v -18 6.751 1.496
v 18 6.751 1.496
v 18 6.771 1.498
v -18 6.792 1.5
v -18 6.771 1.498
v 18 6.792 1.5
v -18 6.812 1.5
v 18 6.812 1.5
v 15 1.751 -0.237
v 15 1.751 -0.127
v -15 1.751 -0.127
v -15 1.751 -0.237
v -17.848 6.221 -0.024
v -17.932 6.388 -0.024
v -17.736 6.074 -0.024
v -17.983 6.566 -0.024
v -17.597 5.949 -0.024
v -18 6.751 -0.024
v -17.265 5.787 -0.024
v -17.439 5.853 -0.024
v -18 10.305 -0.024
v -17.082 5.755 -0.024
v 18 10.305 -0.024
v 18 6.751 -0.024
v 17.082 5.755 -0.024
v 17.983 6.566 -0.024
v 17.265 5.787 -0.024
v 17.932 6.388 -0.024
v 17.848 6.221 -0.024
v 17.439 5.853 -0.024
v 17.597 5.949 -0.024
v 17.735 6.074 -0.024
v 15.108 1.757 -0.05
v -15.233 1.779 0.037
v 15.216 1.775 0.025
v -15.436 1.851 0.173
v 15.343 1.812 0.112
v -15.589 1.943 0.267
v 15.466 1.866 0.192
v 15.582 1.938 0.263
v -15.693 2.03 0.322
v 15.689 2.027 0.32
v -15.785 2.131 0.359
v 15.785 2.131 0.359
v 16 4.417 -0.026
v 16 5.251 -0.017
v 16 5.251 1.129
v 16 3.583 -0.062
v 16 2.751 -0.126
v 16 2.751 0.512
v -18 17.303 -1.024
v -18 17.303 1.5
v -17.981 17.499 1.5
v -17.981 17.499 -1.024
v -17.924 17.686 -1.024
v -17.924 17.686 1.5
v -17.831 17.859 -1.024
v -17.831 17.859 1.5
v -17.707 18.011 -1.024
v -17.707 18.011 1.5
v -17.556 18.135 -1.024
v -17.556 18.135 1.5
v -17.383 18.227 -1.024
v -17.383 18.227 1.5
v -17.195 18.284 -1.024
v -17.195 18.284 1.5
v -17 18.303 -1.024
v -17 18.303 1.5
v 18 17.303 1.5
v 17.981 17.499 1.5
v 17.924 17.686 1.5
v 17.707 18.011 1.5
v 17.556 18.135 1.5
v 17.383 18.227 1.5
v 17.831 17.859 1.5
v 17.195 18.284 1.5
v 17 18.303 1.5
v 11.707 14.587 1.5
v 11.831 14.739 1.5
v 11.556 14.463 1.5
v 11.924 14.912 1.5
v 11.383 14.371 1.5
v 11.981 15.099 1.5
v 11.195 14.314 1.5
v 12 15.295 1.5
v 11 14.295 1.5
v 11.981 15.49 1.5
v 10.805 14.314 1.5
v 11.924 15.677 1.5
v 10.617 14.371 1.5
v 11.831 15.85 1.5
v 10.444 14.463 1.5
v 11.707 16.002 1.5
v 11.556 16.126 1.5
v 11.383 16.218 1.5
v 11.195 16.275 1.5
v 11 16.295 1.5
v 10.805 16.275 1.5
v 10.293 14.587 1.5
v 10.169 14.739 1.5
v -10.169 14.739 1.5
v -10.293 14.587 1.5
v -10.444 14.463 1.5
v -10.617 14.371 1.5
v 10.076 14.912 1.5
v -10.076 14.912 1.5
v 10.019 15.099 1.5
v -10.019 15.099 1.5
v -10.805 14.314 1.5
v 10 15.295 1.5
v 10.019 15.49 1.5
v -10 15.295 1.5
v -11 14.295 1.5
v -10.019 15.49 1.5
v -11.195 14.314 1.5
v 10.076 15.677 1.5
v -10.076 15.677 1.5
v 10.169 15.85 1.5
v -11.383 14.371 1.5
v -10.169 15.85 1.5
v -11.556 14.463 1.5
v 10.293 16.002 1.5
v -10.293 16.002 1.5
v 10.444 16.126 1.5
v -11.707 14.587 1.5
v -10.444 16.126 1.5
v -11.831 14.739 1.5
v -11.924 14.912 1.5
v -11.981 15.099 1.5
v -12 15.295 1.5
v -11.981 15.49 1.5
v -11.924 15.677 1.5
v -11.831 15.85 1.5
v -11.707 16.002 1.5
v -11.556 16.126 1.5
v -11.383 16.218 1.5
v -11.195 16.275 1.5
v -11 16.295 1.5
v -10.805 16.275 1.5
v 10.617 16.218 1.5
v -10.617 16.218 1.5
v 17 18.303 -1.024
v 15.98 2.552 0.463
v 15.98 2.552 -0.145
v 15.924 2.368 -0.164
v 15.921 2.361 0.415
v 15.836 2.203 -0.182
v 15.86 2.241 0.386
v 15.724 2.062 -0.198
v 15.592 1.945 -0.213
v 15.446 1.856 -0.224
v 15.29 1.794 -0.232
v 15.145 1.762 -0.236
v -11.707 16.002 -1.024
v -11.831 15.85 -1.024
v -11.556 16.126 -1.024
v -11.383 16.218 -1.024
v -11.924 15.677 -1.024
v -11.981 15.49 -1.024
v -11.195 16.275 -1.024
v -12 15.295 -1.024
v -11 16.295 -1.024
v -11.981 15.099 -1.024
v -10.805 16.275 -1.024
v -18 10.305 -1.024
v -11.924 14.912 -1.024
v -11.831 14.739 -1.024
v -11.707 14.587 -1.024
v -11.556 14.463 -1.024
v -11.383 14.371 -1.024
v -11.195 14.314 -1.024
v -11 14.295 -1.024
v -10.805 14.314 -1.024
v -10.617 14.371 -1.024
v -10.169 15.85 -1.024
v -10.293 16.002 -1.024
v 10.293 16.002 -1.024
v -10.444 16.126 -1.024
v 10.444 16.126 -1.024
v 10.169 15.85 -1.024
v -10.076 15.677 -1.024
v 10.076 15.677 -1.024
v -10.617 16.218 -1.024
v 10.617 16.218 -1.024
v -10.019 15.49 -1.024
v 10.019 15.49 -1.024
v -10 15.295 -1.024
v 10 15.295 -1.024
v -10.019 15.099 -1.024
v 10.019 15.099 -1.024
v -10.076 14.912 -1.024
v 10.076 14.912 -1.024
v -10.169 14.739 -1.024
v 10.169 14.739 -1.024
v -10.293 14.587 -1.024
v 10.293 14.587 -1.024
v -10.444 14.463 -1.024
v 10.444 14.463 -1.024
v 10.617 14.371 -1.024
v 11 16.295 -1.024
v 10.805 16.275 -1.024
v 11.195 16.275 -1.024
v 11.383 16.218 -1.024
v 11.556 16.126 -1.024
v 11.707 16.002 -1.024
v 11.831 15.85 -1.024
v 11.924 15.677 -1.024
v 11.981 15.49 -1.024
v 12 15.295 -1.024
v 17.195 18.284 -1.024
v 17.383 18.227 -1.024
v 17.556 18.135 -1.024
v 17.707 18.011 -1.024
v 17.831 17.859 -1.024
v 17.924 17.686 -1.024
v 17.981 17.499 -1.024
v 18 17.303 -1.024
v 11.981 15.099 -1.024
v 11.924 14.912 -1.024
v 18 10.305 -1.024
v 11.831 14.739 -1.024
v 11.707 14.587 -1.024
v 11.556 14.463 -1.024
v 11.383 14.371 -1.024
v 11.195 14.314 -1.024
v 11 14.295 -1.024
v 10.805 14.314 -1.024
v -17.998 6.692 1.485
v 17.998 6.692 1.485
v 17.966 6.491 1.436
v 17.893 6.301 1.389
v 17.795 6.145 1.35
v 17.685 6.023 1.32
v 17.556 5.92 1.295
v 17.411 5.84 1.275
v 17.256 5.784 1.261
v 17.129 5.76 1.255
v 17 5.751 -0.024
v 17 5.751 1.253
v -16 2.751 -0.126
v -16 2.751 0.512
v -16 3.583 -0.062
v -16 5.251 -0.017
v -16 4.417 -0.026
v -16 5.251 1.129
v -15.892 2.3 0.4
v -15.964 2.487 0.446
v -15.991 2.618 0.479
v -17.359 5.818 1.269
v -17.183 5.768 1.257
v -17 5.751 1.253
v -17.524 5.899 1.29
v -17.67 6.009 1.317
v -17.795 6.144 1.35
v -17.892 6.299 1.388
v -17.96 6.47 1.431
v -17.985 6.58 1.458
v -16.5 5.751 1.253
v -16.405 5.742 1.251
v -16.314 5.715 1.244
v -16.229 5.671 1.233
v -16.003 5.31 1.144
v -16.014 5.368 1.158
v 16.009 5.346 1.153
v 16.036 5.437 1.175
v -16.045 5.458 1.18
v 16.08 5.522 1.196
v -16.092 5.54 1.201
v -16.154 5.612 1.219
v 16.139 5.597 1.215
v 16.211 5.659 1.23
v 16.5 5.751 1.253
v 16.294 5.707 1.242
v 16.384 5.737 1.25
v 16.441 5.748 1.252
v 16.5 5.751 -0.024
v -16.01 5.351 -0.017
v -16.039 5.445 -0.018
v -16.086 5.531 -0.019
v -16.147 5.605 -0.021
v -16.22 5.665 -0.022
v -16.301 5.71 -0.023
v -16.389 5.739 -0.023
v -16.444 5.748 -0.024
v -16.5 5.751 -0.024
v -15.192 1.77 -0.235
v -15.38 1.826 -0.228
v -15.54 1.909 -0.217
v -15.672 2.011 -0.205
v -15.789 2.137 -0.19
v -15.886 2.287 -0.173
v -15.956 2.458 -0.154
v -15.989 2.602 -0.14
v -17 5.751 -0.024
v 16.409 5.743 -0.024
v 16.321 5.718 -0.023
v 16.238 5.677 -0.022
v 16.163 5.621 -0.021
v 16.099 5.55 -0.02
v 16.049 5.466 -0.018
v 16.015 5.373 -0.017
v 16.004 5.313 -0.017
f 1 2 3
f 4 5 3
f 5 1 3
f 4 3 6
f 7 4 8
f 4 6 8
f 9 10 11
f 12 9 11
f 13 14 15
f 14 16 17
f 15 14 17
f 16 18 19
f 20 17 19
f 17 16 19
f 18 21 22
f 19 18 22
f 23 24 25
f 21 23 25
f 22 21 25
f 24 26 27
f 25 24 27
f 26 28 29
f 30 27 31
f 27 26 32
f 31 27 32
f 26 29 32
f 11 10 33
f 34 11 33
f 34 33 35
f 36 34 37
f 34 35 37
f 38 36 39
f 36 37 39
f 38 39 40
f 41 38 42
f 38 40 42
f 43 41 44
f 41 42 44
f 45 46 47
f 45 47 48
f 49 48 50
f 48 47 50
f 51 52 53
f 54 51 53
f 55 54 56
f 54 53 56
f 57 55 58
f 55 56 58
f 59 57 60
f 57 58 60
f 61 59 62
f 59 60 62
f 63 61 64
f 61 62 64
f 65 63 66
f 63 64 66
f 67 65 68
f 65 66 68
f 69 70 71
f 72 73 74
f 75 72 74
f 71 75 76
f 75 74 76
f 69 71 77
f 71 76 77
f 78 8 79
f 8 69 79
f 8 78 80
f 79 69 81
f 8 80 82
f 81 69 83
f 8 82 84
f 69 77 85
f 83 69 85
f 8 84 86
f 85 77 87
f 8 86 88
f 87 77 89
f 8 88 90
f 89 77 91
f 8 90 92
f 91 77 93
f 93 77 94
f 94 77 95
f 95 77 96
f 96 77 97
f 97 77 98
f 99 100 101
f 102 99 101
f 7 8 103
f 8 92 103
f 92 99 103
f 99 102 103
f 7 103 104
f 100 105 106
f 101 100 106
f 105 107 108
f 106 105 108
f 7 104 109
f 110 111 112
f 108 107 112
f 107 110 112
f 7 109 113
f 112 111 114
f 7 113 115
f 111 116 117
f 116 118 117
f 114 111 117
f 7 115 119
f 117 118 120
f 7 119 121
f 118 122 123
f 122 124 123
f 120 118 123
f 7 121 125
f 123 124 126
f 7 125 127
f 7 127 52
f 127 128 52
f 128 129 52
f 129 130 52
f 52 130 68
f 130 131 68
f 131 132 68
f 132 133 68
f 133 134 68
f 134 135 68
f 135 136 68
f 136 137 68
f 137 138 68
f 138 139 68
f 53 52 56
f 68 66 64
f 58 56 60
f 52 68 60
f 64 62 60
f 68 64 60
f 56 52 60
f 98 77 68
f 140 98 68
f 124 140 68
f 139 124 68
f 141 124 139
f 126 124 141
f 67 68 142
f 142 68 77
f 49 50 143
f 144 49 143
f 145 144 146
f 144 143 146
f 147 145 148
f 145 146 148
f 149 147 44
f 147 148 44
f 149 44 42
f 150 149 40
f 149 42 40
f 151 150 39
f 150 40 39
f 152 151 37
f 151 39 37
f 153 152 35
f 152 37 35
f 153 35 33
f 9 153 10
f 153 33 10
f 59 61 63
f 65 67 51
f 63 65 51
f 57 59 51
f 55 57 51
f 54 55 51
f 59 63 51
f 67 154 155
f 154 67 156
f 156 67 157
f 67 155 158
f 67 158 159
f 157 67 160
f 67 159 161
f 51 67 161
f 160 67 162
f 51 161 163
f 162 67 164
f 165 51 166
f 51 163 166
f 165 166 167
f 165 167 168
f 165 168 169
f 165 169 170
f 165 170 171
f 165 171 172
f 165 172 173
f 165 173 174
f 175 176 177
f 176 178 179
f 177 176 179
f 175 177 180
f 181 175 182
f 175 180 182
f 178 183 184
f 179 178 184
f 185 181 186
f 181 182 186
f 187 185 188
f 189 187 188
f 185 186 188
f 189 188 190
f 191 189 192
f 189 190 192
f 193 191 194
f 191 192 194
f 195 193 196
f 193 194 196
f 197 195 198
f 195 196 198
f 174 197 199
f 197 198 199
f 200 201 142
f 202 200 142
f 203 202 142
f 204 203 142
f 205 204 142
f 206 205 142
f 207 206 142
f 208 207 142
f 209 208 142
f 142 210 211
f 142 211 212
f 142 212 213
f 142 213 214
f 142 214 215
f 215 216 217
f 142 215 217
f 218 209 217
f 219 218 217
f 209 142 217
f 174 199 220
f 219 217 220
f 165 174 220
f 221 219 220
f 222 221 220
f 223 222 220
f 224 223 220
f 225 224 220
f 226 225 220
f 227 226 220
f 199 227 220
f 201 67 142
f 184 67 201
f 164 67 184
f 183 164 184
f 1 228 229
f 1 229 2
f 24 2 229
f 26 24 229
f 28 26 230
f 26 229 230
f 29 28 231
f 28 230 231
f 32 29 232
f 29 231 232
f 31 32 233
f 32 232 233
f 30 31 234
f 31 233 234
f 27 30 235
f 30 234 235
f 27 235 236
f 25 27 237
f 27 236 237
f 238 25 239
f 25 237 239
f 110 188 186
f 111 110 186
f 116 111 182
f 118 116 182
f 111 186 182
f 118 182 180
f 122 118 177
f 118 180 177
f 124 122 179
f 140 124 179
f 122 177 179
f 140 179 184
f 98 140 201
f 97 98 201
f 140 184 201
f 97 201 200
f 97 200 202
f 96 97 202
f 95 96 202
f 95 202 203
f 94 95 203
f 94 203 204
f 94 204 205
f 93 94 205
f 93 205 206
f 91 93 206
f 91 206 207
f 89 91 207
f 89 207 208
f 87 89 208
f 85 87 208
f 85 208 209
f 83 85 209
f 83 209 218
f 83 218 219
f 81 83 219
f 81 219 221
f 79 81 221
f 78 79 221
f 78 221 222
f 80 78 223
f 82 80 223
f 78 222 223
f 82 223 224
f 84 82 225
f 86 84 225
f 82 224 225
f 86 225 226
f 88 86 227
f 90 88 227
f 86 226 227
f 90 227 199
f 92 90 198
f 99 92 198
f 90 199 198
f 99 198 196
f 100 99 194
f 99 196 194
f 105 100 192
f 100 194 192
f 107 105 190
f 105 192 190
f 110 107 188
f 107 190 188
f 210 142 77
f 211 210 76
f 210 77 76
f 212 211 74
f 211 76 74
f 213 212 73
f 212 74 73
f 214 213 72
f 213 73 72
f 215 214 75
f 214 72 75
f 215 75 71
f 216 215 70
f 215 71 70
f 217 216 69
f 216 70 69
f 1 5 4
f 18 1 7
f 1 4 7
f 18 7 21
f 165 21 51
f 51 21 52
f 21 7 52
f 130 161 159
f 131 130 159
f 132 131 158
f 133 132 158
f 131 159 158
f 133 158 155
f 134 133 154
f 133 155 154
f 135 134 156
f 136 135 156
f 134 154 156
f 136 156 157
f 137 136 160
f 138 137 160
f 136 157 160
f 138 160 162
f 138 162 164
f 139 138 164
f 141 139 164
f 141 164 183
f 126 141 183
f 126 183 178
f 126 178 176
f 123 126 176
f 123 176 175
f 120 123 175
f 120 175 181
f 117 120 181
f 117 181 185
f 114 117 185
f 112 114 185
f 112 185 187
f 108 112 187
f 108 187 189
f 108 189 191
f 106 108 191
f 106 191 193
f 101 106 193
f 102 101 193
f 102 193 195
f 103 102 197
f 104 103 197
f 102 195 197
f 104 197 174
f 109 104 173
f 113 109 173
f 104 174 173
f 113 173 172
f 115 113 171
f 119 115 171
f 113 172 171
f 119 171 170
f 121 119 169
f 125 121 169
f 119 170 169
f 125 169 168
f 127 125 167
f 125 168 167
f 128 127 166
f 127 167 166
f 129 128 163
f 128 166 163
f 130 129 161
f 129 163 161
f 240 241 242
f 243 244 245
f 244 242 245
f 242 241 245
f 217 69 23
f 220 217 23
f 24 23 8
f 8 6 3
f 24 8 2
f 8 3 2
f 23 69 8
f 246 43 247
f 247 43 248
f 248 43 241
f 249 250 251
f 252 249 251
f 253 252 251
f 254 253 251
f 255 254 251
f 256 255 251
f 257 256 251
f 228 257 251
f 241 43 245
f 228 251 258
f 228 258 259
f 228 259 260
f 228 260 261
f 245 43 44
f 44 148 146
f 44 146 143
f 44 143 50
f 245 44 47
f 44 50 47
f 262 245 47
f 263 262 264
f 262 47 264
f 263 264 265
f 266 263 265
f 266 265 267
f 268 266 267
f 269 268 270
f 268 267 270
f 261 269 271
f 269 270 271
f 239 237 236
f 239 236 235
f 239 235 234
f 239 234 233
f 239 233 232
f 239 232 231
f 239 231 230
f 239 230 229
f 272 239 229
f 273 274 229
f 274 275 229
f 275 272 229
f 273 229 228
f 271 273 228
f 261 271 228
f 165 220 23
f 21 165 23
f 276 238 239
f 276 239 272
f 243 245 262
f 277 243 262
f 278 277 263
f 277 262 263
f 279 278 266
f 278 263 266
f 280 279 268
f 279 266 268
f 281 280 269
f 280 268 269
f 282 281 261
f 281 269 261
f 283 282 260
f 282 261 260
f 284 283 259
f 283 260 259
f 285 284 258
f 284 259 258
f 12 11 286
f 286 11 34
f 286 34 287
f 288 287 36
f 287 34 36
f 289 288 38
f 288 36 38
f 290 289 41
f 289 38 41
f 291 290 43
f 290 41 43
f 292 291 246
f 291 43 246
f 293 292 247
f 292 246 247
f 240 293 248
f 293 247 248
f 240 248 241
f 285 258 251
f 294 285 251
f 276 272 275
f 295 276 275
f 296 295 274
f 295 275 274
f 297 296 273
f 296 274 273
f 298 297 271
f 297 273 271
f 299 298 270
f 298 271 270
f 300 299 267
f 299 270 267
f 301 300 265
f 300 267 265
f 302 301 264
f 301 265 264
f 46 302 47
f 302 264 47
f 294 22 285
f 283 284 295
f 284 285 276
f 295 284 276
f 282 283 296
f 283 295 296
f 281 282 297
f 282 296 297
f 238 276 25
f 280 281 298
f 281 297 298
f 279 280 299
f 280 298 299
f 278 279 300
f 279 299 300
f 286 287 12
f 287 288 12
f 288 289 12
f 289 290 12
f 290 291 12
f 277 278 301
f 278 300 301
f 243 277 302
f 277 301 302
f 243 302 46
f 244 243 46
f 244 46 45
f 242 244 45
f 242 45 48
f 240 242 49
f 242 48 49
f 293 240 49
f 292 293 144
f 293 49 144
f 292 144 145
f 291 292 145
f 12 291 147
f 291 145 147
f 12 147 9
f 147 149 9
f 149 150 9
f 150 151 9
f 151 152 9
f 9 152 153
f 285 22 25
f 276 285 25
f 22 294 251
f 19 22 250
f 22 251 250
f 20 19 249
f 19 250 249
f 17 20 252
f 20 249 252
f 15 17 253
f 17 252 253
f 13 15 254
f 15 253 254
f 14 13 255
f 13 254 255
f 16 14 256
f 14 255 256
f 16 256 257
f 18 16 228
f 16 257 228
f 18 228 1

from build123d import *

# Parameters (mm, degrees)
BOSS_EXTRUDE1_DEPTH      = 1.5
BOSS_EXTRUDE1_DEPTH_BACK = 1.2
CUT_EXTRUDE1_DEPTH       = 40
SKETCH11_R               = 1
CUT_EXTRUDE2_DEPTH       = 5


with BuildPart() as part:
    # Sketch1 → Boss-Extrude1 (new body, two sides)
    with BuildSketch(Plane.XY) as boss_extrude1_sk:
        with BuildLine():
            Line((-17.999999991, 9.304537824), (-17.999999991, 10.304506021))
            Line((-17.999999991, 10.304506021), (-17.999999991, 17.303464443))
            ThreePointArc((-17.999999991, 17.303464443), (-17.707106772, 18.010571225), (-16.999999991, 18.303464443))
            Line((-16.999999991, 18.303464443), (16.999968161, 18.303464443))
            ThreePointArc((16.999968161, 18.303464443), (17.707074942, 18.010571225), (17.999968161, 17.303464443))
            Line((17.999968161, 17.303464443), (17.999968161, 9.303464443))
            Line((17.999968161, 9.303464443), (17.999968161, 6.751174458))
            ThreePointArc((17.999968161, 6.751174458), (17.707074942, 6.044067677), (16.999968161, 5.751174458))
            Line((16.999968161, 5.751174458), (16.499999991, 5.751174458))
            ThreePointArc((16.499999991, 5.751174458), (16.1464466, 5.604727849), (15.999999991, 5.251174458))
            Line((15.999999991, 5.251174458), (15.999999991, 2.751174458))
            ThreePointArc((15.999999991, 2.751174458), (15.707106772, 2.044067677), (14.999999991, 1.751174458))
            Line((14.999999991, 1.751174458), (-14.999999991, 1.751174458))
            ThreePointArc((-14.999999991, 1.751174458), (-15.707106772, 2.044067677), (-15.999999991, 2.751174458))
            Line((-15.999999991, 2.751174458), (-15.999999991, 5.251174458))
            ThreePointArc((-15.999999991, 5.251174458), (-16.1464466, 5.604727849), (-16.499999991, 5.751174458))
            Line((-16.499999991, 5.751174458), (-16.999999991, 5.751174458))
            ThreePointArc((-16.999999991, 5.751174458), (-17.707106772, 6.044067677), (-17.999999991, 6.751174458))
            Line((-17.999999991, 6.751174458), (-17.999999991, 9.304537824))
        make_face()
    extrude(amount=BOSS_EXTRUDE1_DEPTH)
    extrude(boss_extrude1_sk.sketch, amount=-BOSS_EXTRUDE1_DEPTH_BACK)

    # Sketch3 → Cut-Extrude1 (cut)
    with BuildSketch(Plane(origin=(17.999968161, 0, 0), x_dir=(0, 0, -1), z_dir=(1, 0, 0))):
        with BuildLine():
            Line((0.023796664, 6.751174458), (0.023796664, 5.754537824))
            ThreePointArc((0.023796664, 5.754537824), (0.053060483, 3.748723952), (0.23729316, 1.751174458))
            Line((0.23729316, 1.751174458), (1.2708887, 1.751174458))
            Line((1.2708887, 1.751174458), (1.2708887, 10.304537824))
            Line((1.2708887, 10.304537824), (1.2708887, 10.30507849))
            ThreePointArc((1.2708887, 10.30507849), (7.212872074, 16.614024598), (1.023796664, 22.680762846))
            Line((1.023796664, 22.680762846), (1.023796664, 17.303464443))
            Line((1.023796664, 17.303464443), (1.2, 17.303464443))
            Line((1.2, 17.303464443), (1.2, 6.751174458))
            Line((1.2, 6.751174458), (0.023796664, 6.751174458))
        make_face()
        Polygon((0.023796664, 10.304537824), (0.023796664, 6.751174458), (1.2, 6.751174458), (1.2, 17.303464443), (1.023796664, 17.303464443), (1.023796664, 10.304537824), align=None)
        with BuildLine():
            ThreePointArc((-1.485404738, 6.692099607), (-1.491731963, 6.721473521), (-1.496283327, 6.751174458))
            Line((-1.496283327, 6.751174458), (-1.5, 6.751174458))
            Line((-1.5, 6.751174458), (-1.5, 1.751174458))
            Line((-1.5, 1.751174458), (0.126821568, 1.751174458))
            ThreePointArc((0.126821568, 1.751174458), (-0.181429151, 1.857497567), (-0.358583171, 2.131248481))
            Line((-0.358583171, 2.131248481), (-1.485404738, 6.692099607))
        make_face()
        with BuildLine():
            Line((-1.5, 6.751174458), (-1.496283327, 6.751174458))
            ThreePointArc((-1.496283327, 6.751174458), (-1.499069967, 6.781543322), (-1.5, 6.812025585))
            Line((-1.5, 6.812025585), (-1.5, 6.751174458))
        make_face()
    extrude(amount=-CUT_EXTRUDE1_DEPTH, mode=Mode.SUBTRACT)

    # Sketch11 → Cut-Extrude2 (cut)
    with BuildSketch(Plane(origin=(0, 0, -1.023796664), x_dir=(-1, 0, 0), z_dir=(0, 0, -1))):
        with Locations((11.000015915, 15.294537824)):
            Circle(SKETCH11_R)
        with Locations((-10.999984085, 15.294537824)):
            Circle(SKETCH11_R)
    extrude(amount=-CUT_EXTRUDE2_DEPTH, mode=Mode.SUBTRACT)


solid = part.part
